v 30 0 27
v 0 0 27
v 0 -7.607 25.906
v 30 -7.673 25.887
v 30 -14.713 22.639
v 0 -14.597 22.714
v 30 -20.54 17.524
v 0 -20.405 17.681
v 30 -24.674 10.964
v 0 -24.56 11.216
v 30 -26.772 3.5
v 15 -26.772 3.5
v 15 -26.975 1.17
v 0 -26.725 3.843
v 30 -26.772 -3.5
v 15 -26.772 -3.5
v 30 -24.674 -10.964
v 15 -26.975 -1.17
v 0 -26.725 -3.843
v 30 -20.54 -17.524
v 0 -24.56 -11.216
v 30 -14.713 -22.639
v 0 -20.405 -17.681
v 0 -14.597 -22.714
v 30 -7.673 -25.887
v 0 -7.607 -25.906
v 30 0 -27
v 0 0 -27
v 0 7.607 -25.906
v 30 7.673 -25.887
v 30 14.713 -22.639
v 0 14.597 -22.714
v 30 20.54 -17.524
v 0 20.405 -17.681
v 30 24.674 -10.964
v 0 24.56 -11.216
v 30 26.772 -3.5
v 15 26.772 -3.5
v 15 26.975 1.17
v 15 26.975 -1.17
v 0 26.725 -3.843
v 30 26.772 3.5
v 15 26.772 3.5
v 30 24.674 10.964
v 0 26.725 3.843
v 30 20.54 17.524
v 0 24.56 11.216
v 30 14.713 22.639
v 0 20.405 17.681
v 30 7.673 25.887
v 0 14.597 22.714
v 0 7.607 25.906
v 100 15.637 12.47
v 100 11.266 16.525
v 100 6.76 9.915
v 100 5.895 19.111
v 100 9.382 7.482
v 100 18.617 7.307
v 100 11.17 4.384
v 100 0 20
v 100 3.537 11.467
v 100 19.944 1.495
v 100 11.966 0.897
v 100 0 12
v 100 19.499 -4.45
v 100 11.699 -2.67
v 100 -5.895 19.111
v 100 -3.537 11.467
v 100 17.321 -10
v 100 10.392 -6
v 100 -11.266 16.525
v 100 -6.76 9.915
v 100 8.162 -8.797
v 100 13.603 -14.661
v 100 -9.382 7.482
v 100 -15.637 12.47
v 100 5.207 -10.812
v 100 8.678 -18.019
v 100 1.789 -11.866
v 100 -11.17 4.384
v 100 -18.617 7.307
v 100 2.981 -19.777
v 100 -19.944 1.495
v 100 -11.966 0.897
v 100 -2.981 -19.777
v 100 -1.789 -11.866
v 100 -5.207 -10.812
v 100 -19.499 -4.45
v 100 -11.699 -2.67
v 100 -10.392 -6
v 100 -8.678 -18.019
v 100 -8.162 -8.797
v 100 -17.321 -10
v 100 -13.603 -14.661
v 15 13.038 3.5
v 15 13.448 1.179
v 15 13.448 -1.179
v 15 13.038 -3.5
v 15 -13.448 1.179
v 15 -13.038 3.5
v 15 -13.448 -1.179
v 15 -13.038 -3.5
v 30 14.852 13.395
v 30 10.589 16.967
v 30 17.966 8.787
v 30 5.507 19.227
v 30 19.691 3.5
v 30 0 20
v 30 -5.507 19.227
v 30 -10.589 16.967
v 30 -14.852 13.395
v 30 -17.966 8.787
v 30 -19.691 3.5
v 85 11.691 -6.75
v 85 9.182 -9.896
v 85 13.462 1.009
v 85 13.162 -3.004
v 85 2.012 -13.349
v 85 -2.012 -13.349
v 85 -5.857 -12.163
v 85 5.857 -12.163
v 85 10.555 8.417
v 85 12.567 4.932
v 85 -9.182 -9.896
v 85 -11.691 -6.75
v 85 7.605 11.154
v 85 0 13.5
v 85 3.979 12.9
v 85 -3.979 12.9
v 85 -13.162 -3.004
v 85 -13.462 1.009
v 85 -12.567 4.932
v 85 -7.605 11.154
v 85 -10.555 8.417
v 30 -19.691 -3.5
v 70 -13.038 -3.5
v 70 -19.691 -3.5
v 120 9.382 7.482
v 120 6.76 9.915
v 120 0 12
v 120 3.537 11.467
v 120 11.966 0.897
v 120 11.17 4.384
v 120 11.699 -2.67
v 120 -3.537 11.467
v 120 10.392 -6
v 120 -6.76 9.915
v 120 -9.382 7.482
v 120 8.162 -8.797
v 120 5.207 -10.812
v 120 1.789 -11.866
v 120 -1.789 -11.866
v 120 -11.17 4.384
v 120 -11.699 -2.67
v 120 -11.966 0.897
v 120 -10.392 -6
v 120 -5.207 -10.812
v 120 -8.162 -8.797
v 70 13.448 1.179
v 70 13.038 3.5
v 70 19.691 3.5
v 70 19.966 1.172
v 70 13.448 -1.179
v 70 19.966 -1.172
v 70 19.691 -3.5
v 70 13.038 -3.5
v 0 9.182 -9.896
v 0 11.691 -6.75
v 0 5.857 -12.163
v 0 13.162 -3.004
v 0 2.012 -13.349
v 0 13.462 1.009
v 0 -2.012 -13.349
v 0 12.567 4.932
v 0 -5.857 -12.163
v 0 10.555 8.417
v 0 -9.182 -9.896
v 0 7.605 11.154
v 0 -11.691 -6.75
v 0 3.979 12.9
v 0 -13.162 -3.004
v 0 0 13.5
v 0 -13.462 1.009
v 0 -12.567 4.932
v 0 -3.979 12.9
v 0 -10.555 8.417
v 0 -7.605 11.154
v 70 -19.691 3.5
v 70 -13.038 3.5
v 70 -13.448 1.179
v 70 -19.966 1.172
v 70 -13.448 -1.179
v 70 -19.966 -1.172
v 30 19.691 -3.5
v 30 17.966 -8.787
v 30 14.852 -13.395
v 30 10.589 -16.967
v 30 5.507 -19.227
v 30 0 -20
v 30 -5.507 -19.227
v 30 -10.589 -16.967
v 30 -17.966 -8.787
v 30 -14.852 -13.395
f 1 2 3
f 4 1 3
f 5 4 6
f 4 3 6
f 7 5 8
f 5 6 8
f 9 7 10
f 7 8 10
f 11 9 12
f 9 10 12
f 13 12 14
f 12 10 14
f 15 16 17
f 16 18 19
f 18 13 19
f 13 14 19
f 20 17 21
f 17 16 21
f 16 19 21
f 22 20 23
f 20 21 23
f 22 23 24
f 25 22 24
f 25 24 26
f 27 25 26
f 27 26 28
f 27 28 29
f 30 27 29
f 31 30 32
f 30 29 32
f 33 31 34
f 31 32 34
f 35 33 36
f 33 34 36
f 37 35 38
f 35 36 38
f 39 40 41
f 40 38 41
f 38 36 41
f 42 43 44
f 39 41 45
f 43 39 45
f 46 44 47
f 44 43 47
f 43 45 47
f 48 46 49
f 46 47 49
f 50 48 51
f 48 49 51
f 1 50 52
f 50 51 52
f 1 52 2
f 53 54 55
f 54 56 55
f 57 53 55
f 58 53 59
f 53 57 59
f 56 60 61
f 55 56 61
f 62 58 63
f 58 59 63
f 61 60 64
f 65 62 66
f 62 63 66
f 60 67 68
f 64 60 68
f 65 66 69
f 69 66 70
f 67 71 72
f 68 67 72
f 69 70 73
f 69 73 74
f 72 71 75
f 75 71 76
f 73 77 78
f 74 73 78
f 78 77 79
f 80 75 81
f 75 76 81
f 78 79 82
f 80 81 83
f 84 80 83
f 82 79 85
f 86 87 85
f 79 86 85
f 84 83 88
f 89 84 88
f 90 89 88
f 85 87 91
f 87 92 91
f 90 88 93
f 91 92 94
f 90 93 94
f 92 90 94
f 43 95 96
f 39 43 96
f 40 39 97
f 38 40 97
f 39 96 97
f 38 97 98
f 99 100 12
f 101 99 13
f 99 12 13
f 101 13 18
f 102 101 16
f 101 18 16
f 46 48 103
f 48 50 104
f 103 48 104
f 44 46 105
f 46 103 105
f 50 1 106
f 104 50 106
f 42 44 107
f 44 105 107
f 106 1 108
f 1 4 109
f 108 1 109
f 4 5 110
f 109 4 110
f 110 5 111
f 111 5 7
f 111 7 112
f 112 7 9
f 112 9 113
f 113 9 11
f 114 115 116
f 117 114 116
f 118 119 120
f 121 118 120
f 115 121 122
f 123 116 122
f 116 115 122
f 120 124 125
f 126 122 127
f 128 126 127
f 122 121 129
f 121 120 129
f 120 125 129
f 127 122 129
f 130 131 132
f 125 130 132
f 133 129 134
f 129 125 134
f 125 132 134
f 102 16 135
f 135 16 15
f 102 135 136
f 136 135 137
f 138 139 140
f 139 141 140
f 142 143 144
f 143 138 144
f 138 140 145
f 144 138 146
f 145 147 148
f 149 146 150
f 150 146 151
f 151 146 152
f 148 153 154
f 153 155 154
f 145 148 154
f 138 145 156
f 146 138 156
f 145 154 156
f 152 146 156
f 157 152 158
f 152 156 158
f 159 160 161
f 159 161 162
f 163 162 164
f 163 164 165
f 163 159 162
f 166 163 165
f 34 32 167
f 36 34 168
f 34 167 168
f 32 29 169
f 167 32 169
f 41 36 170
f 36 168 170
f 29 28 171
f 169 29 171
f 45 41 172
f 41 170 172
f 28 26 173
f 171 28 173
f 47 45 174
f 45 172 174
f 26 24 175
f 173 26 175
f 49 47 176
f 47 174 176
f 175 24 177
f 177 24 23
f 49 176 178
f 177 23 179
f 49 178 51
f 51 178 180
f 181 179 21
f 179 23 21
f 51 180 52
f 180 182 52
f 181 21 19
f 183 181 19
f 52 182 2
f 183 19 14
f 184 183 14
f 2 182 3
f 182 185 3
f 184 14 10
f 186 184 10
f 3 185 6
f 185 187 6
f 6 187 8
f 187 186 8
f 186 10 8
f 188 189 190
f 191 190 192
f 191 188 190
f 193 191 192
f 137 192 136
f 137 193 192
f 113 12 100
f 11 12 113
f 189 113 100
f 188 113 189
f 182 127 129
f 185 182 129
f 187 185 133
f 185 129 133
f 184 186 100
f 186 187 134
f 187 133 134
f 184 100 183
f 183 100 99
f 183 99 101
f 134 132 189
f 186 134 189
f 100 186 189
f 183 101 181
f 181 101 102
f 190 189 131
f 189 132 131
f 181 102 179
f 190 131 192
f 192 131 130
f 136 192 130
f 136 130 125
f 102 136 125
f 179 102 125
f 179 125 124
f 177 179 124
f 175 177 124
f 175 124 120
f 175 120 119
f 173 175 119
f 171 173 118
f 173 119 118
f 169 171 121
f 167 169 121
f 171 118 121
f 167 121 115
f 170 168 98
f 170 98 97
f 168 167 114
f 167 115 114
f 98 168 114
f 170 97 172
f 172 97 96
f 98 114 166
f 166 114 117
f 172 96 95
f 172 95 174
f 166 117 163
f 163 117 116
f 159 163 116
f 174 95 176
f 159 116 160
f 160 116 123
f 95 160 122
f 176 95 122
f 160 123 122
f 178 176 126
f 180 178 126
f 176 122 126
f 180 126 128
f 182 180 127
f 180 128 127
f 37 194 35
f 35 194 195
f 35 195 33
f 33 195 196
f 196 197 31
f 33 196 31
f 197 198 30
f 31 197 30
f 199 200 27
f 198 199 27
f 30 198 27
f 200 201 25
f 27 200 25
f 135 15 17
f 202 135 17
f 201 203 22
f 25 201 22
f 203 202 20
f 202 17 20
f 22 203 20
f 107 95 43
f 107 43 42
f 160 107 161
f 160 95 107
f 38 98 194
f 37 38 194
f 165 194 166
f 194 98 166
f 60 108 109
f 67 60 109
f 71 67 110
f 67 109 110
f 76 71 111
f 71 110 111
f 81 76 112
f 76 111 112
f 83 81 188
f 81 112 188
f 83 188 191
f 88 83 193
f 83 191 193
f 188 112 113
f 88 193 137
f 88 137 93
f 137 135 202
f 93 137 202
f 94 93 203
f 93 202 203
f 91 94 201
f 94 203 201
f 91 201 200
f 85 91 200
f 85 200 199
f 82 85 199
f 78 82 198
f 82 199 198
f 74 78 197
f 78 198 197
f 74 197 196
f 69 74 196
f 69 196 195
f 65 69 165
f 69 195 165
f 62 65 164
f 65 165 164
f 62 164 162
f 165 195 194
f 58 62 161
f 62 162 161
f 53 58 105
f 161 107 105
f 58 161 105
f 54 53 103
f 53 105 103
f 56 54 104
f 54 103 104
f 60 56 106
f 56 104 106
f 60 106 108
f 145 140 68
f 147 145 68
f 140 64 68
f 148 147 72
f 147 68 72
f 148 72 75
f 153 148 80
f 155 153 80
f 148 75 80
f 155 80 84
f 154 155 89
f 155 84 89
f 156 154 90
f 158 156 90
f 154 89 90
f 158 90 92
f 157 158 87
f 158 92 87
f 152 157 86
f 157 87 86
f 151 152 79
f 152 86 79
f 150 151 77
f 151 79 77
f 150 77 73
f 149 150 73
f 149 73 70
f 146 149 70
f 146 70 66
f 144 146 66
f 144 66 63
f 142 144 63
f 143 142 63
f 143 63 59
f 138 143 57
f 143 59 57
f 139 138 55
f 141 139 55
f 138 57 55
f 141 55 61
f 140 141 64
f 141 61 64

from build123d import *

# Parameters (mm, degrees)
CUT_EXTRUDE1_DEPTH      = 126.928551171
CUT_EXTRUDE1_DEPTH_BACK = 126.928551171
SKETCH2_W               = 55
SKETCH2_H               = 7


with BuildPart() as part:
    # Sketch1 → Revolve1 (revolve)
    with BuildSketch(Plane(origin=(0, 0, 0), x_dir=(1, 0, 0), z_dir=(0, 1, 0)), mode=Mode.PRIVATE) as revolve1_sk:
        Polygon((120, 0), (120, 12), (100, 12), (100, 20), (30, 20), (30, 27), (0, 27), (0, 13.5), (85, 13.5), (85, 0), align=None)
    revolve(revolve1_sk.sketch.rotate(Axis((0, 0, 0), (1, 0, 0)), 180), axis=Axis((0, 0, 0), (1, 0, 0)))

    # Sketch2 → Cut-Extrude1 (cut, two sides: drawn at the far end of the back side and taken through both)
    with BuildSketch(Plane(origin=(0, 0, 0), x_dir=(1, 0, 0), z_dir=(0, 1, 0)).offset(-CUT_EXTRUDE1_DEPTH_BACK)):
        with Locations((42.5, 0)):
            Rectangle(SKETCH2_W, SKETCH2_H)
    extrude(amount=CUT_EXTRUDE1_DEPTH + CUT_EXTRUDE1_DEPTH_BACK, mode=Mode.SUBTRACT)


solid = part.part
